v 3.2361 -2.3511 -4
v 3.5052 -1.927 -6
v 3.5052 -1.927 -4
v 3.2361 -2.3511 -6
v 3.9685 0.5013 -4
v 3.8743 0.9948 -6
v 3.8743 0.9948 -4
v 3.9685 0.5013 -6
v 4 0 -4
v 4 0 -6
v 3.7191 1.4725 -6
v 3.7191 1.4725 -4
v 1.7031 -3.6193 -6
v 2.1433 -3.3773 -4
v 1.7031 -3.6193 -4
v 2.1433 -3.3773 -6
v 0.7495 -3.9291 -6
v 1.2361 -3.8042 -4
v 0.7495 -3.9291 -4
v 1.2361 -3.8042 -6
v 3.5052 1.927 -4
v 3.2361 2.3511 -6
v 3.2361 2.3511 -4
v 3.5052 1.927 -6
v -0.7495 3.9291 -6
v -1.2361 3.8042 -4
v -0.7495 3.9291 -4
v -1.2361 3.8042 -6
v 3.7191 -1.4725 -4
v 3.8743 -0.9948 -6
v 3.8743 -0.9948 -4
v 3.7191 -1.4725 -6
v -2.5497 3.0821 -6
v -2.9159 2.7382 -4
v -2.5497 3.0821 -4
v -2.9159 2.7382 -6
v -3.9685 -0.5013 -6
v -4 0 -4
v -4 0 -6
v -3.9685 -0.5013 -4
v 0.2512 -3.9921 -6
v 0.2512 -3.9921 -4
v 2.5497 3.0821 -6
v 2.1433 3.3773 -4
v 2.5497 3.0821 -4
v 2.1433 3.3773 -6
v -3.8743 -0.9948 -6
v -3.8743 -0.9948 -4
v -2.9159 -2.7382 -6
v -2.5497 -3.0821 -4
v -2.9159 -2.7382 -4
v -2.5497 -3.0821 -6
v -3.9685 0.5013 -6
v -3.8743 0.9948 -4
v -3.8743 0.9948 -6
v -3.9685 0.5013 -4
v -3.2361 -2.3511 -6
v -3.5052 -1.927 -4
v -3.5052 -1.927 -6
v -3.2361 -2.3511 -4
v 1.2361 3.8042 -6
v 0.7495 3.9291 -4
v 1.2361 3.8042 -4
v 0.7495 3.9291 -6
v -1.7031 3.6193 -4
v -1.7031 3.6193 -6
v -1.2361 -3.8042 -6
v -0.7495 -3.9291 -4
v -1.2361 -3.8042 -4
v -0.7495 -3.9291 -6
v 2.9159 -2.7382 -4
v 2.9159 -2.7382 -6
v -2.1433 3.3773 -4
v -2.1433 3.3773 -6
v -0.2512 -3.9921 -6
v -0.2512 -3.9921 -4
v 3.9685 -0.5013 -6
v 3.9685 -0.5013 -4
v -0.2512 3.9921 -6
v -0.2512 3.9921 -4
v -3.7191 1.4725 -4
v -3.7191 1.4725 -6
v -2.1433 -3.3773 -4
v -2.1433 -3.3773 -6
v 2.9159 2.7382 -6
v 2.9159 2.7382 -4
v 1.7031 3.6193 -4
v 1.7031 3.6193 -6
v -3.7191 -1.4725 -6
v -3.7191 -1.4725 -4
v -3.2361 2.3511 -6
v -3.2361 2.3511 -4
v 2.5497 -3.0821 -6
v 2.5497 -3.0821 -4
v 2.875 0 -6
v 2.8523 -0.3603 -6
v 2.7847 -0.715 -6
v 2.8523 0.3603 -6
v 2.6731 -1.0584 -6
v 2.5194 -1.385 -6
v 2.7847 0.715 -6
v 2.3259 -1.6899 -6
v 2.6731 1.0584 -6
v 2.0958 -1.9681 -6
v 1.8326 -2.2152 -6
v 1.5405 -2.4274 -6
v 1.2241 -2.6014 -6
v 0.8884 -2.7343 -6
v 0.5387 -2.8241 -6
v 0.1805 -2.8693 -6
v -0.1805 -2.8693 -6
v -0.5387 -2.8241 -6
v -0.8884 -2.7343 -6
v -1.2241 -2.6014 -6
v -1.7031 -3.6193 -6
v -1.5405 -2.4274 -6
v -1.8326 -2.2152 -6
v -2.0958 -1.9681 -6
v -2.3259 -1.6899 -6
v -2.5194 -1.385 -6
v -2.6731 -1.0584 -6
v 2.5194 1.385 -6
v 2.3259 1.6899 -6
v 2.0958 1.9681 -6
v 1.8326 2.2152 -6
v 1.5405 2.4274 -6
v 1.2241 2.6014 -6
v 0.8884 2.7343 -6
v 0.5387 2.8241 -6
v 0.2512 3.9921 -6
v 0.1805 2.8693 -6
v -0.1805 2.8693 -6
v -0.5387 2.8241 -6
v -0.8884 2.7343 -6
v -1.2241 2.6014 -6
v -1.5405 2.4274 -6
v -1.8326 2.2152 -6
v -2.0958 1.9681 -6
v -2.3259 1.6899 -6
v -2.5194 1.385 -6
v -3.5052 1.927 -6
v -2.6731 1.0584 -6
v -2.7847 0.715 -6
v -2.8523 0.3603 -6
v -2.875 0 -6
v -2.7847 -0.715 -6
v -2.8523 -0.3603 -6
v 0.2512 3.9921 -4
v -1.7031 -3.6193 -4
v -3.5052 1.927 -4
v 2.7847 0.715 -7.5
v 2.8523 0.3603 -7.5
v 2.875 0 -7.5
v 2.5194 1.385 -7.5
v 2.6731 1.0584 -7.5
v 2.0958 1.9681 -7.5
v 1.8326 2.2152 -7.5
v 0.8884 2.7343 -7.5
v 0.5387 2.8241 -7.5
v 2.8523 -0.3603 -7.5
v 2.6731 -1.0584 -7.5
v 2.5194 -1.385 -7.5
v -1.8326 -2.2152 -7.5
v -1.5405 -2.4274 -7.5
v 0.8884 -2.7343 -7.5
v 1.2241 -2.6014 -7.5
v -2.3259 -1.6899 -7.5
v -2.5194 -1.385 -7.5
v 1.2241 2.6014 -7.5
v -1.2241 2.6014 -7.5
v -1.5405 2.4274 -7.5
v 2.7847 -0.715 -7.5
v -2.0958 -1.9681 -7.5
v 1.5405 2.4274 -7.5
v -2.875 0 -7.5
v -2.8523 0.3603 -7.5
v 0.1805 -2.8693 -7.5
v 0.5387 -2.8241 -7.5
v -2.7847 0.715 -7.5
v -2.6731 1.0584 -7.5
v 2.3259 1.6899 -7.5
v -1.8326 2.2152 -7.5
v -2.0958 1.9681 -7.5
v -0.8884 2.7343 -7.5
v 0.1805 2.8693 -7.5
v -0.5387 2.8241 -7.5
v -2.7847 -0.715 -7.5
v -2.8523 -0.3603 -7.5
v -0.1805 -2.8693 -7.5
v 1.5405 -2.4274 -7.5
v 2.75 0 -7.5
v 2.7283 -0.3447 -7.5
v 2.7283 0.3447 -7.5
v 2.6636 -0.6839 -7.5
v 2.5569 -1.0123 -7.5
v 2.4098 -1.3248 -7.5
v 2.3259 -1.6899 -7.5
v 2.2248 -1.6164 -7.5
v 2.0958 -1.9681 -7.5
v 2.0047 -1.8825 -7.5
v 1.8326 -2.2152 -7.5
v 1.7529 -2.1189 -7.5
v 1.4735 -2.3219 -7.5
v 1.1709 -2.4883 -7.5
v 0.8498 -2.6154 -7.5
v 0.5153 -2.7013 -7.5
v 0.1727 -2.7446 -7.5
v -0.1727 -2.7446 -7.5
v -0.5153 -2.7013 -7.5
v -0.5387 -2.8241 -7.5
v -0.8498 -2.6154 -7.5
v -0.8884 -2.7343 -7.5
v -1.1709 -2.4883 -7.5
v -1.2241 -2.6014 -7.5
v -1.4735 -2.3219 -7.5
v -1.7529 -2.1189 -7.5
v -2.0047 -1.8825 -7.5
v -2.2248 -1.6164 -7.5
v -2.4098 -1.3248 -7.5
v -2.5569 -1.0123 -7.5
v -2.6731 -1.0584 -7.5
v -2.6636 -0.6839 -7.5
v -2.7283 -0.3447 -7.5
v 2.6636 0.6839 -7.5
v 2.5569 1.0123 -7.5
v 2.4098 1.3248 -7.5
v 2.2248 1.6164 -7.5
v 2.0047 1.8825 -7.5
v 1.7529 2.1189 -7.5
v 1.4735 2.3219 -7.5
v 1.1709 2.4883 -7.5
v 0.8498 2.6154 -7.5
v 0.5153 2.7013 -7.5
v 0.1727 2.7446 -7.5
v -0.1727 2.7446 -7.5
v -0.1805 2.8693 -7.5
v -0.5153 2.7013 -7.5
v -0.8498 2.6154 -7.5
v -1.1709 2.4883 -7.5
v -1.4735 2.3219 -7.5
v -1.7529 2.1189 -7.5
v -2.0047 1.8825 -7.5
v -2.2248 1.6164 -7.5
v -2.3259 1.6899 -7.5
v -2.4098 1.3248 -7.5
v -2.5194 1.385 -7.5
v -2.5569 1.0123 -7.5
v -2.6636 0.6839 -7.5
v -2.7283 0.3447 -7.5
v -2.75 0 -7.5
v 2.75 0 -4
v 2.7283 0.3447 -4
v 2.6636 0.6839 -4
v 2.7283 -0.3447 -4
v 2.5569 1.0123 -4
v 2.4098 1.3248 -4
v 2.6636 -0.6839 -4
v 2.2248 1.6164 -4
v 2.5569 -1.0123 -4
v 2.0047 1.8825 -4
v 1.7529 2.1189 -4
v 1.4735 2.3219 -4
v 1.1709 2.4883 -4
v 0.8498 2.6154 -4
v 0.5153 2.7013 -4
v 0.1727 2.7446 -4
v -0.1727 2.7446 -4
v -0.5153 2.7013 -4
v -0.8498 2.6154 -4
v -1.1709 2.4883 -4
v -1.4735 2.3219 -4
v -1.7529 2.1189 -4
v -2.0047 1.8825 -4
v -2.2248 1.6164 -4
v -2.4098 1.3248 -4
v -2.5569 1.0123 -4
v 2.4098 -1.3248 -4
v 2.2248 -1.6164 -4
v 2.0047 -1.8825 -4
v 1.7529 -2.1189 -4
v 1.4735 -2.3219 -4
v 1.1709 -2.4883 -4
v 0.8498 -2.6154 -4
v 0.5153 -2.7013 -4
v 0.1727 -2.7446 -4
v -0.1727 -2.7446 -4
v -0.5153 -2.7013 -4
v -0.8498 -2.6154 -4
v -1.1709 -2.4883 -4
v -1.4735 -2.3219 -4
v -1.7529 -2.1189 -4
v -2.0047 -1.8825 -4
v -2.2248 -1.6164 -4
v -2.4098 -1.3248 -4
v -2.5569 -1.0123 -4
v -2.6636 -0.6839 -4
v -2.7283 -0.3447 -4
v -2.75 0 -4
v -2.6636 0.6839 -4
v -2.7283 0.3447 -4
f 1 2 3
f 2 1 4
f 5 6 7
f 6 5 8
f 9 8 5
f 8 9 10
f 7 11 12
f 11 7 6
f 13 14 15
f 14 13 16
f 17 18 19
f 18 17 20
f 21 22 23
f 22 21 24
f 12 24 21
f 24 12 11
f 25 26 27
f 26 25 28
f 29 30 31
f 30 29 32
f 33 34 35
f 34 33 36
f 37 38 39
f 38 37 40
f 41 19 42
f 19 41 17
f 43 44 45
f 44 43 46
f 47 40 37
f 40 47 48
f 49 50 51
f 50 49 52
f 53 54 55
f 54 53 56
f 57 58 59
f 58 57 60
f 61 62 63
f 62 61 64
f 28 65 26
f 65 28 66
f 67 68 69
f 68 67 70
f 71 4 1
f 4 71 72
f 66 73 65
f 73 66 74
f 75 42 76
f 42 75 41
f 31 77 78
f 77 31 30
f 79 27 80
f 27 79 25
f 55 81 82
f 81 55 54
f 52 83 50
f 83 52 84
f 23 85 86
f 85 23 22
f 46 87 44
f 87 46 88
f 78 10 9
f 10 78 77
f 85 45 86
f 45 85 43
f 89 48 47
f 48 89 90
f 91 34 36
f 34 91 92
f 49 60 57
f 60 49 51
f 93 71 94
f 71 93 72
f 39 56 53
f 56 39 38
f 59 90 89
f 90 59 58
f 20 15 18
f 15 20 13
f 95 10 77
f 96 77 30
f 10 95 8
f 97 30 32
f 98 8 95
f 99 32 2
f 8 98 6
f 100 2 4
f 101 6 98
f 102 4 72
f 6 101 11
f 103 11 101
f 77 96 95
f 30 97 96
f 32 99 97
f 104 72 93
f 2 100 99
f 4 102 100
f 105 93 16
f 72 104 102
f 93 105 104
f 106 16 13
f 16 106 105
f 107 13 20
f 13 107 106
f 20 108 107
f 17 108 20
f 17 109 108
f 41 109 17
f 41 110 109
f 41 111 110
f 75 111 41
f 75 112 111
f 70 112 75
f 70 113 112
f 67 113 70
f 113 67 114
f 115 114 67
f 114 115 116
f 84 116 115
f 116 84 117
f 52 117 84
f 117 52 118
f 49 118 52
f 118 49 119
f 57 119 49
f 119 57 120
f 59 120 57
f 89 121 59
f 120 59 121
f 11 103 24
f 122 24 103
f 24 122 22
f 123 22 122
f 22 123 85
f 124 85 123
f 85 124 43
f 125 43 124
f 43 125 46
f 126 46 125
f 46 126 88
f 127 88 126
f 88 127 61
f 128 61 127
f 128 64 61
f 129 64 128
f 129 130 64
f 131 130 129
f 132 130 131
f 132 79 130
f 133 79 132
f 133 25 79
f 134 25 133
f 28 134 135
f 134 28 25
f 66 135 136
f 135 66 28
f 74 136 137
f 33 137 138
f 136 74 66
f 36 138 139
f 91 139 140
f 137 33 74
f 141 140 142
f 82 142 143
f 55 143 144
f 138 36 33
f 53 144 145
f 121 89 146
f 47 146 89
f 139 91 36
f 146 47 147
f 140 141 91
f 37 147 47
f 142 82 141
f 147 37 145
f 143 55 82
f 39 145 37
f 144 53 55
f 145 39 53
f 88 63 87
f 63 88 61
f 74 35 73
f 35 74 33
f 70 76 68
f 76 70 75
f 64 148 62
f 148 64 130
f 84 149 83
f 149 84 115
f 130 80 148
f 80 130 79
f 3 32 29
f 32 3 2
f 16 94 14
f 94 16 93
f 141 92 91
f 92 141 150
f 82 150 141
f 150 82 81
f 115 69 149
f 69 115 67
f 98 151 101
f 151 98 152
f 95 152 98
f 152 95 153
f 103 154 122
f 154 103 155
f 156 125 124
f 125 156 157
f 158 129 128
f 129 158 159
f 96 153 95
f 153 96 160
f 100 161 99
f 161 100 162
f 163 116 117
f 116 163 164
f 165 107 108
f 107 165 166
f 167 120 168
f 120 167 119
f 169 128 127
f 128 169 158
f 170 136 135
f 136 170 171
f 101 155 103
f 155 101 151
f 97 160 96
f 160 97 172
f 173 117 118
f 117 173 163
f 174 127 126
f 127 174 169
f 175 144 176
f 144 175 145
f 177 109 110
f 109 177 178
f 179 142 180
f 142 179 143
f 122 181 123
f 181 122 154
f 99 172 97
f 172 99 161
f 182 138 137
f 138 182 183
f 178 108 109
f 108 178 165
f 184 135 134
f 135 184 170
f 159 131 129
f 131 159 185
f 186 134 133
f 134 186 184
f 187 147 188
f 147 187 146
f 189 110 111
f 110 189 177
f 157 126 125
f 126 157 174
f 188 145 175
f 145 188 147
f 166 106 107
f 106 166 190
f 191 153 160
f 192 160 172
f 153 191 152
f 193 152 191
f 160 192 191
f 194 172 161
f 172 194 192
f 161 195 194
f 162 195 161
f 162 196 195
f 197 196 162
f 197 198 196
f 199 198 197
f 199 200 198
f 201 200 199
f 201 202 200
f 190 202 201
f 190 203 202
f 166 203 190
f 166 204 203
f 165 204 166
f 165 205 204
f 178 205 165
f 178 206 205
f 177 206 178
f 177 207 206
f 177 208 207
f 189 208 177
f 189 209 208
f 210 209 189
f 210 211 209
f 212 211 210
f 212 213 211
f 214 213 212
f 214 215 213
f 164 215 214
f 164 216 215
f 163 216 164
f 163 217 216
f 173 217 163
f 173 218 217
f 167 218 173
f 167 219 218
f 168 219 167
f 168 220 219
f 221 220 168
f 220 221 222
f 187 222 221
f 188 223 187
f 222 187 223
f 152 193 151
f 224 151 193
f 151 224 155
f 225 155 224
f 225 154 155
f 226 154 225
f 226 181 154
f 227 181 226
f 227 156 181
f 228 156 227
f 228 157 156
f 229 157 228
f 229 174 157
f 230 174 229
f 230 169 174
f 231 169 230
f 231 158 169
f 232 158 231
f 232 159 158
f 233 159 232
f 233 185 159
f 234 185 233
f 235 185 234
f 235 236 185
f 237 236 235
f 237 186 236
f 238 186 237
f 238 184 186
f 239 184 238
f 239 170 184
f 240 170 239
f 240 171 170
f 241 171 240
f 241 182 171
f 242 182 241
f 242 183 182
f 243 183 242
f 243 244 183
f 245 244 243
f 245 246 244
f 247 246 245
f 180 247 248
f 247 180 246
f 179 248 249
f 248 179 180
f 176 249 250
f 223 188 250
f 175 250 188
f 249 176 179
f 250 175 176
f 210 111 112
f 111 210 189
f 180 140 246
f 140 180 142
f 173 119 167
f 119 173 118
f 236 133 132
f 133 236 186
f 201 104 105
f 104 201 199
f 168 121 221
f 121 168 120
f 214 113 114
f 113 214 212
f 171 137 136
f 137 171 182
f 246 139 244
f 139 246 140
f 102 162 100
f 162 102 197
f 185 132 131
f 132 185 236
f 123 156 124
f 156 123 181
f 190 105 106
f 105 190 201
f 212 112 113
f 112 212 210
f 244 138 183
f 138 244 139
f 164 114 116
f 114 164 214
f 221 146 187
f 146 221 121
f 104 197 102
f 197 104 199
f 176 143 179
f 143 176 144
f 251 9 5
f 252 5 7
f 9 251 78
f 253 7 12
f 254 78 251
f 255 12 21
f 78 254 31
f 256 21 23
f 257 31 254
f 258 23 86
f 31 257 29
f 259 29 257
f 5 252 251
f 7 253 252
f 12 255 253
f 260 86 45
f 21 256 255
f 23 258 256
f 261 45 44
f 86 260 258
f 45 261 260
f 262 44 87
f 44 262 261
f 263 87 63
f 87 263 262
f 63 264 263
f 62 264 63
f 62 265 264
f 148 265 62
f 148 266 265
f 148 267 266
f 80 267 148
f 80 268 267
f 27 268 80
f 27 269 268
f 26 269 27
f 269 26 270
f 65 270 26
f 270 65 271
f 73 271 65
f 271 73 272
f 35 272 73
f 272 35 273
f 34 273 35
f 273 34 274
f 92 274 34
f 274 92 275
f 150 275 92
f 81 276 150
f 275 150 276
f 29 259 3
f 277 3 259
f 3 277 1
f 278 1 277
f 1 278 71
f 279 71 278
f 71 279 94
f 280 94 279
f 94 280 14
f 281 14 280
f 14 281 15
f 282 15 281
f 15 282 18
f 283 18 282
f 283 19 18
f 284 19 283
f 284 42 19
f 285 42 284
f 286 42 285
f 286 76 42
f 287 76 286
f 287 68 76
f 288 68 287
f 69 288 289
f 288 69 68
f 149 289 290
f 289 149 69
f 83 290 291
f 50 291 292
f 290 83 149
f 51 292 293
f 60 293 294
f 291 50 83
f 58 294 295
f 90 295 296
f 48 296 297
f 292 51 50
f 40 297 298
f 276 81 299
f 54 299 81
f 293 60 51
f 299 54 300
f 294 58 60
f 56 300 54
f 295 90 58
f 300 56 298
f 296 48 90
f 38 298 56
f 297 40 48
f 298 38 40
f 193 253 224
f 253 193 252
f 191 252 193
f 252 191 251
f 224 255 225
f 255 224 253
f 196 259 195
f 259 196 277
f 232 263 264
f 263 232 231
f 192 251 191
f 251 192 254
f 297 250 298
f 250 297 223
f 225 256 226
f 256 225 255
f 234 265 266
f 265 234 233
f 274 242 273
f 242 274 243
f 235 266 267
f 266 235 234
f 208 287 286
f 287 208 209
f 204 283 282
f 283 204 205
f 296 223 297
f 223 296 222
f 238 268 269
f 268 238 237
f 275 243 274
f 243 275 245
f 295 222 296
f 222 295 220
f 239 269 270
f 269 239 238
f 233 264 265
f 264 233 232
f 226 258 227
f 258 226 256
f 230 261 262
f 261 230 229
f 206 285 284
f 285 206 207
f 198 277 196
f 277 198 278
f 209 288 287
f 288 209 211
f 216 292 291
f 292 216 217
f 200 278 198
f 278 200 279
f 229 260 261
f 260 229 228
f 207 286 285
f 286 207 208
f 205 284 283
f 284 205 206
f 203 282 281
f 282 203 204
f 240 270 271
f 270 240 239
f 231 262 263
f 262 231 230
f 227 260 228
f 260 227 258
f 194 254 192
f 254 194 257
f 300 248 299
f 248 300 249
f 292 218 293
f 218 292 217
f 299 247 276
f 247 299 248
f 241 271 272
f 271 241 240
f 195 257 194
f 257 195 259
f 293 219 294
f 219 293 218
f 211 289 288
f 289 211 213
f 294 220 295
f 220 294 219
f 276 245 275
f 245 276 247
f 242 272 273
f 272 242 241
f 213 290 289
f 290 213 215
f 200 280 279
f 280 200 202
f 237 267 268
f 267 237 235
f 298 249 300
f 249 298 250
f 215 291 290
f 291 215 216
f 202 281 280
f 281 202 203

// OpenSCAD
$fn = 50;

difference() {
	union() {
		translate(v = [0, 0, -6.0]) {
			cylinder(h = 9.0, r = 4.0);
		}
		#translate(v = [0, 0, -7.5]) {
			cylinder(h = 7.5, r = 2.875);
		}
	}
	union() {
		translate(v = [0, 0, 0]) {
			rotate(a = [0, 0, 0]) {
				difference() {
					union() {
						translate(v = [0, 0, -4]) {
							linear_extrude(height = 4) {
								polygon(points = [[4.8468, 0.0], [2.4234000000000004, 4.197451927062417], [-2.423399999999999, 4.197451927062417], [-4.8468, 5.935618106107392e-16], [-2.423400000000002, -4.197451927062416], [2.423399999999997, -4.197451927062419]]);
							}
						}
					}
					union();
				}
			}
		}
		#cylinder(h = 3, r = 6.25);
		#translate(v = [0, 0, -100.0]) {
			cylinder(h = 200, r = 2.75);
		}
	}
}
